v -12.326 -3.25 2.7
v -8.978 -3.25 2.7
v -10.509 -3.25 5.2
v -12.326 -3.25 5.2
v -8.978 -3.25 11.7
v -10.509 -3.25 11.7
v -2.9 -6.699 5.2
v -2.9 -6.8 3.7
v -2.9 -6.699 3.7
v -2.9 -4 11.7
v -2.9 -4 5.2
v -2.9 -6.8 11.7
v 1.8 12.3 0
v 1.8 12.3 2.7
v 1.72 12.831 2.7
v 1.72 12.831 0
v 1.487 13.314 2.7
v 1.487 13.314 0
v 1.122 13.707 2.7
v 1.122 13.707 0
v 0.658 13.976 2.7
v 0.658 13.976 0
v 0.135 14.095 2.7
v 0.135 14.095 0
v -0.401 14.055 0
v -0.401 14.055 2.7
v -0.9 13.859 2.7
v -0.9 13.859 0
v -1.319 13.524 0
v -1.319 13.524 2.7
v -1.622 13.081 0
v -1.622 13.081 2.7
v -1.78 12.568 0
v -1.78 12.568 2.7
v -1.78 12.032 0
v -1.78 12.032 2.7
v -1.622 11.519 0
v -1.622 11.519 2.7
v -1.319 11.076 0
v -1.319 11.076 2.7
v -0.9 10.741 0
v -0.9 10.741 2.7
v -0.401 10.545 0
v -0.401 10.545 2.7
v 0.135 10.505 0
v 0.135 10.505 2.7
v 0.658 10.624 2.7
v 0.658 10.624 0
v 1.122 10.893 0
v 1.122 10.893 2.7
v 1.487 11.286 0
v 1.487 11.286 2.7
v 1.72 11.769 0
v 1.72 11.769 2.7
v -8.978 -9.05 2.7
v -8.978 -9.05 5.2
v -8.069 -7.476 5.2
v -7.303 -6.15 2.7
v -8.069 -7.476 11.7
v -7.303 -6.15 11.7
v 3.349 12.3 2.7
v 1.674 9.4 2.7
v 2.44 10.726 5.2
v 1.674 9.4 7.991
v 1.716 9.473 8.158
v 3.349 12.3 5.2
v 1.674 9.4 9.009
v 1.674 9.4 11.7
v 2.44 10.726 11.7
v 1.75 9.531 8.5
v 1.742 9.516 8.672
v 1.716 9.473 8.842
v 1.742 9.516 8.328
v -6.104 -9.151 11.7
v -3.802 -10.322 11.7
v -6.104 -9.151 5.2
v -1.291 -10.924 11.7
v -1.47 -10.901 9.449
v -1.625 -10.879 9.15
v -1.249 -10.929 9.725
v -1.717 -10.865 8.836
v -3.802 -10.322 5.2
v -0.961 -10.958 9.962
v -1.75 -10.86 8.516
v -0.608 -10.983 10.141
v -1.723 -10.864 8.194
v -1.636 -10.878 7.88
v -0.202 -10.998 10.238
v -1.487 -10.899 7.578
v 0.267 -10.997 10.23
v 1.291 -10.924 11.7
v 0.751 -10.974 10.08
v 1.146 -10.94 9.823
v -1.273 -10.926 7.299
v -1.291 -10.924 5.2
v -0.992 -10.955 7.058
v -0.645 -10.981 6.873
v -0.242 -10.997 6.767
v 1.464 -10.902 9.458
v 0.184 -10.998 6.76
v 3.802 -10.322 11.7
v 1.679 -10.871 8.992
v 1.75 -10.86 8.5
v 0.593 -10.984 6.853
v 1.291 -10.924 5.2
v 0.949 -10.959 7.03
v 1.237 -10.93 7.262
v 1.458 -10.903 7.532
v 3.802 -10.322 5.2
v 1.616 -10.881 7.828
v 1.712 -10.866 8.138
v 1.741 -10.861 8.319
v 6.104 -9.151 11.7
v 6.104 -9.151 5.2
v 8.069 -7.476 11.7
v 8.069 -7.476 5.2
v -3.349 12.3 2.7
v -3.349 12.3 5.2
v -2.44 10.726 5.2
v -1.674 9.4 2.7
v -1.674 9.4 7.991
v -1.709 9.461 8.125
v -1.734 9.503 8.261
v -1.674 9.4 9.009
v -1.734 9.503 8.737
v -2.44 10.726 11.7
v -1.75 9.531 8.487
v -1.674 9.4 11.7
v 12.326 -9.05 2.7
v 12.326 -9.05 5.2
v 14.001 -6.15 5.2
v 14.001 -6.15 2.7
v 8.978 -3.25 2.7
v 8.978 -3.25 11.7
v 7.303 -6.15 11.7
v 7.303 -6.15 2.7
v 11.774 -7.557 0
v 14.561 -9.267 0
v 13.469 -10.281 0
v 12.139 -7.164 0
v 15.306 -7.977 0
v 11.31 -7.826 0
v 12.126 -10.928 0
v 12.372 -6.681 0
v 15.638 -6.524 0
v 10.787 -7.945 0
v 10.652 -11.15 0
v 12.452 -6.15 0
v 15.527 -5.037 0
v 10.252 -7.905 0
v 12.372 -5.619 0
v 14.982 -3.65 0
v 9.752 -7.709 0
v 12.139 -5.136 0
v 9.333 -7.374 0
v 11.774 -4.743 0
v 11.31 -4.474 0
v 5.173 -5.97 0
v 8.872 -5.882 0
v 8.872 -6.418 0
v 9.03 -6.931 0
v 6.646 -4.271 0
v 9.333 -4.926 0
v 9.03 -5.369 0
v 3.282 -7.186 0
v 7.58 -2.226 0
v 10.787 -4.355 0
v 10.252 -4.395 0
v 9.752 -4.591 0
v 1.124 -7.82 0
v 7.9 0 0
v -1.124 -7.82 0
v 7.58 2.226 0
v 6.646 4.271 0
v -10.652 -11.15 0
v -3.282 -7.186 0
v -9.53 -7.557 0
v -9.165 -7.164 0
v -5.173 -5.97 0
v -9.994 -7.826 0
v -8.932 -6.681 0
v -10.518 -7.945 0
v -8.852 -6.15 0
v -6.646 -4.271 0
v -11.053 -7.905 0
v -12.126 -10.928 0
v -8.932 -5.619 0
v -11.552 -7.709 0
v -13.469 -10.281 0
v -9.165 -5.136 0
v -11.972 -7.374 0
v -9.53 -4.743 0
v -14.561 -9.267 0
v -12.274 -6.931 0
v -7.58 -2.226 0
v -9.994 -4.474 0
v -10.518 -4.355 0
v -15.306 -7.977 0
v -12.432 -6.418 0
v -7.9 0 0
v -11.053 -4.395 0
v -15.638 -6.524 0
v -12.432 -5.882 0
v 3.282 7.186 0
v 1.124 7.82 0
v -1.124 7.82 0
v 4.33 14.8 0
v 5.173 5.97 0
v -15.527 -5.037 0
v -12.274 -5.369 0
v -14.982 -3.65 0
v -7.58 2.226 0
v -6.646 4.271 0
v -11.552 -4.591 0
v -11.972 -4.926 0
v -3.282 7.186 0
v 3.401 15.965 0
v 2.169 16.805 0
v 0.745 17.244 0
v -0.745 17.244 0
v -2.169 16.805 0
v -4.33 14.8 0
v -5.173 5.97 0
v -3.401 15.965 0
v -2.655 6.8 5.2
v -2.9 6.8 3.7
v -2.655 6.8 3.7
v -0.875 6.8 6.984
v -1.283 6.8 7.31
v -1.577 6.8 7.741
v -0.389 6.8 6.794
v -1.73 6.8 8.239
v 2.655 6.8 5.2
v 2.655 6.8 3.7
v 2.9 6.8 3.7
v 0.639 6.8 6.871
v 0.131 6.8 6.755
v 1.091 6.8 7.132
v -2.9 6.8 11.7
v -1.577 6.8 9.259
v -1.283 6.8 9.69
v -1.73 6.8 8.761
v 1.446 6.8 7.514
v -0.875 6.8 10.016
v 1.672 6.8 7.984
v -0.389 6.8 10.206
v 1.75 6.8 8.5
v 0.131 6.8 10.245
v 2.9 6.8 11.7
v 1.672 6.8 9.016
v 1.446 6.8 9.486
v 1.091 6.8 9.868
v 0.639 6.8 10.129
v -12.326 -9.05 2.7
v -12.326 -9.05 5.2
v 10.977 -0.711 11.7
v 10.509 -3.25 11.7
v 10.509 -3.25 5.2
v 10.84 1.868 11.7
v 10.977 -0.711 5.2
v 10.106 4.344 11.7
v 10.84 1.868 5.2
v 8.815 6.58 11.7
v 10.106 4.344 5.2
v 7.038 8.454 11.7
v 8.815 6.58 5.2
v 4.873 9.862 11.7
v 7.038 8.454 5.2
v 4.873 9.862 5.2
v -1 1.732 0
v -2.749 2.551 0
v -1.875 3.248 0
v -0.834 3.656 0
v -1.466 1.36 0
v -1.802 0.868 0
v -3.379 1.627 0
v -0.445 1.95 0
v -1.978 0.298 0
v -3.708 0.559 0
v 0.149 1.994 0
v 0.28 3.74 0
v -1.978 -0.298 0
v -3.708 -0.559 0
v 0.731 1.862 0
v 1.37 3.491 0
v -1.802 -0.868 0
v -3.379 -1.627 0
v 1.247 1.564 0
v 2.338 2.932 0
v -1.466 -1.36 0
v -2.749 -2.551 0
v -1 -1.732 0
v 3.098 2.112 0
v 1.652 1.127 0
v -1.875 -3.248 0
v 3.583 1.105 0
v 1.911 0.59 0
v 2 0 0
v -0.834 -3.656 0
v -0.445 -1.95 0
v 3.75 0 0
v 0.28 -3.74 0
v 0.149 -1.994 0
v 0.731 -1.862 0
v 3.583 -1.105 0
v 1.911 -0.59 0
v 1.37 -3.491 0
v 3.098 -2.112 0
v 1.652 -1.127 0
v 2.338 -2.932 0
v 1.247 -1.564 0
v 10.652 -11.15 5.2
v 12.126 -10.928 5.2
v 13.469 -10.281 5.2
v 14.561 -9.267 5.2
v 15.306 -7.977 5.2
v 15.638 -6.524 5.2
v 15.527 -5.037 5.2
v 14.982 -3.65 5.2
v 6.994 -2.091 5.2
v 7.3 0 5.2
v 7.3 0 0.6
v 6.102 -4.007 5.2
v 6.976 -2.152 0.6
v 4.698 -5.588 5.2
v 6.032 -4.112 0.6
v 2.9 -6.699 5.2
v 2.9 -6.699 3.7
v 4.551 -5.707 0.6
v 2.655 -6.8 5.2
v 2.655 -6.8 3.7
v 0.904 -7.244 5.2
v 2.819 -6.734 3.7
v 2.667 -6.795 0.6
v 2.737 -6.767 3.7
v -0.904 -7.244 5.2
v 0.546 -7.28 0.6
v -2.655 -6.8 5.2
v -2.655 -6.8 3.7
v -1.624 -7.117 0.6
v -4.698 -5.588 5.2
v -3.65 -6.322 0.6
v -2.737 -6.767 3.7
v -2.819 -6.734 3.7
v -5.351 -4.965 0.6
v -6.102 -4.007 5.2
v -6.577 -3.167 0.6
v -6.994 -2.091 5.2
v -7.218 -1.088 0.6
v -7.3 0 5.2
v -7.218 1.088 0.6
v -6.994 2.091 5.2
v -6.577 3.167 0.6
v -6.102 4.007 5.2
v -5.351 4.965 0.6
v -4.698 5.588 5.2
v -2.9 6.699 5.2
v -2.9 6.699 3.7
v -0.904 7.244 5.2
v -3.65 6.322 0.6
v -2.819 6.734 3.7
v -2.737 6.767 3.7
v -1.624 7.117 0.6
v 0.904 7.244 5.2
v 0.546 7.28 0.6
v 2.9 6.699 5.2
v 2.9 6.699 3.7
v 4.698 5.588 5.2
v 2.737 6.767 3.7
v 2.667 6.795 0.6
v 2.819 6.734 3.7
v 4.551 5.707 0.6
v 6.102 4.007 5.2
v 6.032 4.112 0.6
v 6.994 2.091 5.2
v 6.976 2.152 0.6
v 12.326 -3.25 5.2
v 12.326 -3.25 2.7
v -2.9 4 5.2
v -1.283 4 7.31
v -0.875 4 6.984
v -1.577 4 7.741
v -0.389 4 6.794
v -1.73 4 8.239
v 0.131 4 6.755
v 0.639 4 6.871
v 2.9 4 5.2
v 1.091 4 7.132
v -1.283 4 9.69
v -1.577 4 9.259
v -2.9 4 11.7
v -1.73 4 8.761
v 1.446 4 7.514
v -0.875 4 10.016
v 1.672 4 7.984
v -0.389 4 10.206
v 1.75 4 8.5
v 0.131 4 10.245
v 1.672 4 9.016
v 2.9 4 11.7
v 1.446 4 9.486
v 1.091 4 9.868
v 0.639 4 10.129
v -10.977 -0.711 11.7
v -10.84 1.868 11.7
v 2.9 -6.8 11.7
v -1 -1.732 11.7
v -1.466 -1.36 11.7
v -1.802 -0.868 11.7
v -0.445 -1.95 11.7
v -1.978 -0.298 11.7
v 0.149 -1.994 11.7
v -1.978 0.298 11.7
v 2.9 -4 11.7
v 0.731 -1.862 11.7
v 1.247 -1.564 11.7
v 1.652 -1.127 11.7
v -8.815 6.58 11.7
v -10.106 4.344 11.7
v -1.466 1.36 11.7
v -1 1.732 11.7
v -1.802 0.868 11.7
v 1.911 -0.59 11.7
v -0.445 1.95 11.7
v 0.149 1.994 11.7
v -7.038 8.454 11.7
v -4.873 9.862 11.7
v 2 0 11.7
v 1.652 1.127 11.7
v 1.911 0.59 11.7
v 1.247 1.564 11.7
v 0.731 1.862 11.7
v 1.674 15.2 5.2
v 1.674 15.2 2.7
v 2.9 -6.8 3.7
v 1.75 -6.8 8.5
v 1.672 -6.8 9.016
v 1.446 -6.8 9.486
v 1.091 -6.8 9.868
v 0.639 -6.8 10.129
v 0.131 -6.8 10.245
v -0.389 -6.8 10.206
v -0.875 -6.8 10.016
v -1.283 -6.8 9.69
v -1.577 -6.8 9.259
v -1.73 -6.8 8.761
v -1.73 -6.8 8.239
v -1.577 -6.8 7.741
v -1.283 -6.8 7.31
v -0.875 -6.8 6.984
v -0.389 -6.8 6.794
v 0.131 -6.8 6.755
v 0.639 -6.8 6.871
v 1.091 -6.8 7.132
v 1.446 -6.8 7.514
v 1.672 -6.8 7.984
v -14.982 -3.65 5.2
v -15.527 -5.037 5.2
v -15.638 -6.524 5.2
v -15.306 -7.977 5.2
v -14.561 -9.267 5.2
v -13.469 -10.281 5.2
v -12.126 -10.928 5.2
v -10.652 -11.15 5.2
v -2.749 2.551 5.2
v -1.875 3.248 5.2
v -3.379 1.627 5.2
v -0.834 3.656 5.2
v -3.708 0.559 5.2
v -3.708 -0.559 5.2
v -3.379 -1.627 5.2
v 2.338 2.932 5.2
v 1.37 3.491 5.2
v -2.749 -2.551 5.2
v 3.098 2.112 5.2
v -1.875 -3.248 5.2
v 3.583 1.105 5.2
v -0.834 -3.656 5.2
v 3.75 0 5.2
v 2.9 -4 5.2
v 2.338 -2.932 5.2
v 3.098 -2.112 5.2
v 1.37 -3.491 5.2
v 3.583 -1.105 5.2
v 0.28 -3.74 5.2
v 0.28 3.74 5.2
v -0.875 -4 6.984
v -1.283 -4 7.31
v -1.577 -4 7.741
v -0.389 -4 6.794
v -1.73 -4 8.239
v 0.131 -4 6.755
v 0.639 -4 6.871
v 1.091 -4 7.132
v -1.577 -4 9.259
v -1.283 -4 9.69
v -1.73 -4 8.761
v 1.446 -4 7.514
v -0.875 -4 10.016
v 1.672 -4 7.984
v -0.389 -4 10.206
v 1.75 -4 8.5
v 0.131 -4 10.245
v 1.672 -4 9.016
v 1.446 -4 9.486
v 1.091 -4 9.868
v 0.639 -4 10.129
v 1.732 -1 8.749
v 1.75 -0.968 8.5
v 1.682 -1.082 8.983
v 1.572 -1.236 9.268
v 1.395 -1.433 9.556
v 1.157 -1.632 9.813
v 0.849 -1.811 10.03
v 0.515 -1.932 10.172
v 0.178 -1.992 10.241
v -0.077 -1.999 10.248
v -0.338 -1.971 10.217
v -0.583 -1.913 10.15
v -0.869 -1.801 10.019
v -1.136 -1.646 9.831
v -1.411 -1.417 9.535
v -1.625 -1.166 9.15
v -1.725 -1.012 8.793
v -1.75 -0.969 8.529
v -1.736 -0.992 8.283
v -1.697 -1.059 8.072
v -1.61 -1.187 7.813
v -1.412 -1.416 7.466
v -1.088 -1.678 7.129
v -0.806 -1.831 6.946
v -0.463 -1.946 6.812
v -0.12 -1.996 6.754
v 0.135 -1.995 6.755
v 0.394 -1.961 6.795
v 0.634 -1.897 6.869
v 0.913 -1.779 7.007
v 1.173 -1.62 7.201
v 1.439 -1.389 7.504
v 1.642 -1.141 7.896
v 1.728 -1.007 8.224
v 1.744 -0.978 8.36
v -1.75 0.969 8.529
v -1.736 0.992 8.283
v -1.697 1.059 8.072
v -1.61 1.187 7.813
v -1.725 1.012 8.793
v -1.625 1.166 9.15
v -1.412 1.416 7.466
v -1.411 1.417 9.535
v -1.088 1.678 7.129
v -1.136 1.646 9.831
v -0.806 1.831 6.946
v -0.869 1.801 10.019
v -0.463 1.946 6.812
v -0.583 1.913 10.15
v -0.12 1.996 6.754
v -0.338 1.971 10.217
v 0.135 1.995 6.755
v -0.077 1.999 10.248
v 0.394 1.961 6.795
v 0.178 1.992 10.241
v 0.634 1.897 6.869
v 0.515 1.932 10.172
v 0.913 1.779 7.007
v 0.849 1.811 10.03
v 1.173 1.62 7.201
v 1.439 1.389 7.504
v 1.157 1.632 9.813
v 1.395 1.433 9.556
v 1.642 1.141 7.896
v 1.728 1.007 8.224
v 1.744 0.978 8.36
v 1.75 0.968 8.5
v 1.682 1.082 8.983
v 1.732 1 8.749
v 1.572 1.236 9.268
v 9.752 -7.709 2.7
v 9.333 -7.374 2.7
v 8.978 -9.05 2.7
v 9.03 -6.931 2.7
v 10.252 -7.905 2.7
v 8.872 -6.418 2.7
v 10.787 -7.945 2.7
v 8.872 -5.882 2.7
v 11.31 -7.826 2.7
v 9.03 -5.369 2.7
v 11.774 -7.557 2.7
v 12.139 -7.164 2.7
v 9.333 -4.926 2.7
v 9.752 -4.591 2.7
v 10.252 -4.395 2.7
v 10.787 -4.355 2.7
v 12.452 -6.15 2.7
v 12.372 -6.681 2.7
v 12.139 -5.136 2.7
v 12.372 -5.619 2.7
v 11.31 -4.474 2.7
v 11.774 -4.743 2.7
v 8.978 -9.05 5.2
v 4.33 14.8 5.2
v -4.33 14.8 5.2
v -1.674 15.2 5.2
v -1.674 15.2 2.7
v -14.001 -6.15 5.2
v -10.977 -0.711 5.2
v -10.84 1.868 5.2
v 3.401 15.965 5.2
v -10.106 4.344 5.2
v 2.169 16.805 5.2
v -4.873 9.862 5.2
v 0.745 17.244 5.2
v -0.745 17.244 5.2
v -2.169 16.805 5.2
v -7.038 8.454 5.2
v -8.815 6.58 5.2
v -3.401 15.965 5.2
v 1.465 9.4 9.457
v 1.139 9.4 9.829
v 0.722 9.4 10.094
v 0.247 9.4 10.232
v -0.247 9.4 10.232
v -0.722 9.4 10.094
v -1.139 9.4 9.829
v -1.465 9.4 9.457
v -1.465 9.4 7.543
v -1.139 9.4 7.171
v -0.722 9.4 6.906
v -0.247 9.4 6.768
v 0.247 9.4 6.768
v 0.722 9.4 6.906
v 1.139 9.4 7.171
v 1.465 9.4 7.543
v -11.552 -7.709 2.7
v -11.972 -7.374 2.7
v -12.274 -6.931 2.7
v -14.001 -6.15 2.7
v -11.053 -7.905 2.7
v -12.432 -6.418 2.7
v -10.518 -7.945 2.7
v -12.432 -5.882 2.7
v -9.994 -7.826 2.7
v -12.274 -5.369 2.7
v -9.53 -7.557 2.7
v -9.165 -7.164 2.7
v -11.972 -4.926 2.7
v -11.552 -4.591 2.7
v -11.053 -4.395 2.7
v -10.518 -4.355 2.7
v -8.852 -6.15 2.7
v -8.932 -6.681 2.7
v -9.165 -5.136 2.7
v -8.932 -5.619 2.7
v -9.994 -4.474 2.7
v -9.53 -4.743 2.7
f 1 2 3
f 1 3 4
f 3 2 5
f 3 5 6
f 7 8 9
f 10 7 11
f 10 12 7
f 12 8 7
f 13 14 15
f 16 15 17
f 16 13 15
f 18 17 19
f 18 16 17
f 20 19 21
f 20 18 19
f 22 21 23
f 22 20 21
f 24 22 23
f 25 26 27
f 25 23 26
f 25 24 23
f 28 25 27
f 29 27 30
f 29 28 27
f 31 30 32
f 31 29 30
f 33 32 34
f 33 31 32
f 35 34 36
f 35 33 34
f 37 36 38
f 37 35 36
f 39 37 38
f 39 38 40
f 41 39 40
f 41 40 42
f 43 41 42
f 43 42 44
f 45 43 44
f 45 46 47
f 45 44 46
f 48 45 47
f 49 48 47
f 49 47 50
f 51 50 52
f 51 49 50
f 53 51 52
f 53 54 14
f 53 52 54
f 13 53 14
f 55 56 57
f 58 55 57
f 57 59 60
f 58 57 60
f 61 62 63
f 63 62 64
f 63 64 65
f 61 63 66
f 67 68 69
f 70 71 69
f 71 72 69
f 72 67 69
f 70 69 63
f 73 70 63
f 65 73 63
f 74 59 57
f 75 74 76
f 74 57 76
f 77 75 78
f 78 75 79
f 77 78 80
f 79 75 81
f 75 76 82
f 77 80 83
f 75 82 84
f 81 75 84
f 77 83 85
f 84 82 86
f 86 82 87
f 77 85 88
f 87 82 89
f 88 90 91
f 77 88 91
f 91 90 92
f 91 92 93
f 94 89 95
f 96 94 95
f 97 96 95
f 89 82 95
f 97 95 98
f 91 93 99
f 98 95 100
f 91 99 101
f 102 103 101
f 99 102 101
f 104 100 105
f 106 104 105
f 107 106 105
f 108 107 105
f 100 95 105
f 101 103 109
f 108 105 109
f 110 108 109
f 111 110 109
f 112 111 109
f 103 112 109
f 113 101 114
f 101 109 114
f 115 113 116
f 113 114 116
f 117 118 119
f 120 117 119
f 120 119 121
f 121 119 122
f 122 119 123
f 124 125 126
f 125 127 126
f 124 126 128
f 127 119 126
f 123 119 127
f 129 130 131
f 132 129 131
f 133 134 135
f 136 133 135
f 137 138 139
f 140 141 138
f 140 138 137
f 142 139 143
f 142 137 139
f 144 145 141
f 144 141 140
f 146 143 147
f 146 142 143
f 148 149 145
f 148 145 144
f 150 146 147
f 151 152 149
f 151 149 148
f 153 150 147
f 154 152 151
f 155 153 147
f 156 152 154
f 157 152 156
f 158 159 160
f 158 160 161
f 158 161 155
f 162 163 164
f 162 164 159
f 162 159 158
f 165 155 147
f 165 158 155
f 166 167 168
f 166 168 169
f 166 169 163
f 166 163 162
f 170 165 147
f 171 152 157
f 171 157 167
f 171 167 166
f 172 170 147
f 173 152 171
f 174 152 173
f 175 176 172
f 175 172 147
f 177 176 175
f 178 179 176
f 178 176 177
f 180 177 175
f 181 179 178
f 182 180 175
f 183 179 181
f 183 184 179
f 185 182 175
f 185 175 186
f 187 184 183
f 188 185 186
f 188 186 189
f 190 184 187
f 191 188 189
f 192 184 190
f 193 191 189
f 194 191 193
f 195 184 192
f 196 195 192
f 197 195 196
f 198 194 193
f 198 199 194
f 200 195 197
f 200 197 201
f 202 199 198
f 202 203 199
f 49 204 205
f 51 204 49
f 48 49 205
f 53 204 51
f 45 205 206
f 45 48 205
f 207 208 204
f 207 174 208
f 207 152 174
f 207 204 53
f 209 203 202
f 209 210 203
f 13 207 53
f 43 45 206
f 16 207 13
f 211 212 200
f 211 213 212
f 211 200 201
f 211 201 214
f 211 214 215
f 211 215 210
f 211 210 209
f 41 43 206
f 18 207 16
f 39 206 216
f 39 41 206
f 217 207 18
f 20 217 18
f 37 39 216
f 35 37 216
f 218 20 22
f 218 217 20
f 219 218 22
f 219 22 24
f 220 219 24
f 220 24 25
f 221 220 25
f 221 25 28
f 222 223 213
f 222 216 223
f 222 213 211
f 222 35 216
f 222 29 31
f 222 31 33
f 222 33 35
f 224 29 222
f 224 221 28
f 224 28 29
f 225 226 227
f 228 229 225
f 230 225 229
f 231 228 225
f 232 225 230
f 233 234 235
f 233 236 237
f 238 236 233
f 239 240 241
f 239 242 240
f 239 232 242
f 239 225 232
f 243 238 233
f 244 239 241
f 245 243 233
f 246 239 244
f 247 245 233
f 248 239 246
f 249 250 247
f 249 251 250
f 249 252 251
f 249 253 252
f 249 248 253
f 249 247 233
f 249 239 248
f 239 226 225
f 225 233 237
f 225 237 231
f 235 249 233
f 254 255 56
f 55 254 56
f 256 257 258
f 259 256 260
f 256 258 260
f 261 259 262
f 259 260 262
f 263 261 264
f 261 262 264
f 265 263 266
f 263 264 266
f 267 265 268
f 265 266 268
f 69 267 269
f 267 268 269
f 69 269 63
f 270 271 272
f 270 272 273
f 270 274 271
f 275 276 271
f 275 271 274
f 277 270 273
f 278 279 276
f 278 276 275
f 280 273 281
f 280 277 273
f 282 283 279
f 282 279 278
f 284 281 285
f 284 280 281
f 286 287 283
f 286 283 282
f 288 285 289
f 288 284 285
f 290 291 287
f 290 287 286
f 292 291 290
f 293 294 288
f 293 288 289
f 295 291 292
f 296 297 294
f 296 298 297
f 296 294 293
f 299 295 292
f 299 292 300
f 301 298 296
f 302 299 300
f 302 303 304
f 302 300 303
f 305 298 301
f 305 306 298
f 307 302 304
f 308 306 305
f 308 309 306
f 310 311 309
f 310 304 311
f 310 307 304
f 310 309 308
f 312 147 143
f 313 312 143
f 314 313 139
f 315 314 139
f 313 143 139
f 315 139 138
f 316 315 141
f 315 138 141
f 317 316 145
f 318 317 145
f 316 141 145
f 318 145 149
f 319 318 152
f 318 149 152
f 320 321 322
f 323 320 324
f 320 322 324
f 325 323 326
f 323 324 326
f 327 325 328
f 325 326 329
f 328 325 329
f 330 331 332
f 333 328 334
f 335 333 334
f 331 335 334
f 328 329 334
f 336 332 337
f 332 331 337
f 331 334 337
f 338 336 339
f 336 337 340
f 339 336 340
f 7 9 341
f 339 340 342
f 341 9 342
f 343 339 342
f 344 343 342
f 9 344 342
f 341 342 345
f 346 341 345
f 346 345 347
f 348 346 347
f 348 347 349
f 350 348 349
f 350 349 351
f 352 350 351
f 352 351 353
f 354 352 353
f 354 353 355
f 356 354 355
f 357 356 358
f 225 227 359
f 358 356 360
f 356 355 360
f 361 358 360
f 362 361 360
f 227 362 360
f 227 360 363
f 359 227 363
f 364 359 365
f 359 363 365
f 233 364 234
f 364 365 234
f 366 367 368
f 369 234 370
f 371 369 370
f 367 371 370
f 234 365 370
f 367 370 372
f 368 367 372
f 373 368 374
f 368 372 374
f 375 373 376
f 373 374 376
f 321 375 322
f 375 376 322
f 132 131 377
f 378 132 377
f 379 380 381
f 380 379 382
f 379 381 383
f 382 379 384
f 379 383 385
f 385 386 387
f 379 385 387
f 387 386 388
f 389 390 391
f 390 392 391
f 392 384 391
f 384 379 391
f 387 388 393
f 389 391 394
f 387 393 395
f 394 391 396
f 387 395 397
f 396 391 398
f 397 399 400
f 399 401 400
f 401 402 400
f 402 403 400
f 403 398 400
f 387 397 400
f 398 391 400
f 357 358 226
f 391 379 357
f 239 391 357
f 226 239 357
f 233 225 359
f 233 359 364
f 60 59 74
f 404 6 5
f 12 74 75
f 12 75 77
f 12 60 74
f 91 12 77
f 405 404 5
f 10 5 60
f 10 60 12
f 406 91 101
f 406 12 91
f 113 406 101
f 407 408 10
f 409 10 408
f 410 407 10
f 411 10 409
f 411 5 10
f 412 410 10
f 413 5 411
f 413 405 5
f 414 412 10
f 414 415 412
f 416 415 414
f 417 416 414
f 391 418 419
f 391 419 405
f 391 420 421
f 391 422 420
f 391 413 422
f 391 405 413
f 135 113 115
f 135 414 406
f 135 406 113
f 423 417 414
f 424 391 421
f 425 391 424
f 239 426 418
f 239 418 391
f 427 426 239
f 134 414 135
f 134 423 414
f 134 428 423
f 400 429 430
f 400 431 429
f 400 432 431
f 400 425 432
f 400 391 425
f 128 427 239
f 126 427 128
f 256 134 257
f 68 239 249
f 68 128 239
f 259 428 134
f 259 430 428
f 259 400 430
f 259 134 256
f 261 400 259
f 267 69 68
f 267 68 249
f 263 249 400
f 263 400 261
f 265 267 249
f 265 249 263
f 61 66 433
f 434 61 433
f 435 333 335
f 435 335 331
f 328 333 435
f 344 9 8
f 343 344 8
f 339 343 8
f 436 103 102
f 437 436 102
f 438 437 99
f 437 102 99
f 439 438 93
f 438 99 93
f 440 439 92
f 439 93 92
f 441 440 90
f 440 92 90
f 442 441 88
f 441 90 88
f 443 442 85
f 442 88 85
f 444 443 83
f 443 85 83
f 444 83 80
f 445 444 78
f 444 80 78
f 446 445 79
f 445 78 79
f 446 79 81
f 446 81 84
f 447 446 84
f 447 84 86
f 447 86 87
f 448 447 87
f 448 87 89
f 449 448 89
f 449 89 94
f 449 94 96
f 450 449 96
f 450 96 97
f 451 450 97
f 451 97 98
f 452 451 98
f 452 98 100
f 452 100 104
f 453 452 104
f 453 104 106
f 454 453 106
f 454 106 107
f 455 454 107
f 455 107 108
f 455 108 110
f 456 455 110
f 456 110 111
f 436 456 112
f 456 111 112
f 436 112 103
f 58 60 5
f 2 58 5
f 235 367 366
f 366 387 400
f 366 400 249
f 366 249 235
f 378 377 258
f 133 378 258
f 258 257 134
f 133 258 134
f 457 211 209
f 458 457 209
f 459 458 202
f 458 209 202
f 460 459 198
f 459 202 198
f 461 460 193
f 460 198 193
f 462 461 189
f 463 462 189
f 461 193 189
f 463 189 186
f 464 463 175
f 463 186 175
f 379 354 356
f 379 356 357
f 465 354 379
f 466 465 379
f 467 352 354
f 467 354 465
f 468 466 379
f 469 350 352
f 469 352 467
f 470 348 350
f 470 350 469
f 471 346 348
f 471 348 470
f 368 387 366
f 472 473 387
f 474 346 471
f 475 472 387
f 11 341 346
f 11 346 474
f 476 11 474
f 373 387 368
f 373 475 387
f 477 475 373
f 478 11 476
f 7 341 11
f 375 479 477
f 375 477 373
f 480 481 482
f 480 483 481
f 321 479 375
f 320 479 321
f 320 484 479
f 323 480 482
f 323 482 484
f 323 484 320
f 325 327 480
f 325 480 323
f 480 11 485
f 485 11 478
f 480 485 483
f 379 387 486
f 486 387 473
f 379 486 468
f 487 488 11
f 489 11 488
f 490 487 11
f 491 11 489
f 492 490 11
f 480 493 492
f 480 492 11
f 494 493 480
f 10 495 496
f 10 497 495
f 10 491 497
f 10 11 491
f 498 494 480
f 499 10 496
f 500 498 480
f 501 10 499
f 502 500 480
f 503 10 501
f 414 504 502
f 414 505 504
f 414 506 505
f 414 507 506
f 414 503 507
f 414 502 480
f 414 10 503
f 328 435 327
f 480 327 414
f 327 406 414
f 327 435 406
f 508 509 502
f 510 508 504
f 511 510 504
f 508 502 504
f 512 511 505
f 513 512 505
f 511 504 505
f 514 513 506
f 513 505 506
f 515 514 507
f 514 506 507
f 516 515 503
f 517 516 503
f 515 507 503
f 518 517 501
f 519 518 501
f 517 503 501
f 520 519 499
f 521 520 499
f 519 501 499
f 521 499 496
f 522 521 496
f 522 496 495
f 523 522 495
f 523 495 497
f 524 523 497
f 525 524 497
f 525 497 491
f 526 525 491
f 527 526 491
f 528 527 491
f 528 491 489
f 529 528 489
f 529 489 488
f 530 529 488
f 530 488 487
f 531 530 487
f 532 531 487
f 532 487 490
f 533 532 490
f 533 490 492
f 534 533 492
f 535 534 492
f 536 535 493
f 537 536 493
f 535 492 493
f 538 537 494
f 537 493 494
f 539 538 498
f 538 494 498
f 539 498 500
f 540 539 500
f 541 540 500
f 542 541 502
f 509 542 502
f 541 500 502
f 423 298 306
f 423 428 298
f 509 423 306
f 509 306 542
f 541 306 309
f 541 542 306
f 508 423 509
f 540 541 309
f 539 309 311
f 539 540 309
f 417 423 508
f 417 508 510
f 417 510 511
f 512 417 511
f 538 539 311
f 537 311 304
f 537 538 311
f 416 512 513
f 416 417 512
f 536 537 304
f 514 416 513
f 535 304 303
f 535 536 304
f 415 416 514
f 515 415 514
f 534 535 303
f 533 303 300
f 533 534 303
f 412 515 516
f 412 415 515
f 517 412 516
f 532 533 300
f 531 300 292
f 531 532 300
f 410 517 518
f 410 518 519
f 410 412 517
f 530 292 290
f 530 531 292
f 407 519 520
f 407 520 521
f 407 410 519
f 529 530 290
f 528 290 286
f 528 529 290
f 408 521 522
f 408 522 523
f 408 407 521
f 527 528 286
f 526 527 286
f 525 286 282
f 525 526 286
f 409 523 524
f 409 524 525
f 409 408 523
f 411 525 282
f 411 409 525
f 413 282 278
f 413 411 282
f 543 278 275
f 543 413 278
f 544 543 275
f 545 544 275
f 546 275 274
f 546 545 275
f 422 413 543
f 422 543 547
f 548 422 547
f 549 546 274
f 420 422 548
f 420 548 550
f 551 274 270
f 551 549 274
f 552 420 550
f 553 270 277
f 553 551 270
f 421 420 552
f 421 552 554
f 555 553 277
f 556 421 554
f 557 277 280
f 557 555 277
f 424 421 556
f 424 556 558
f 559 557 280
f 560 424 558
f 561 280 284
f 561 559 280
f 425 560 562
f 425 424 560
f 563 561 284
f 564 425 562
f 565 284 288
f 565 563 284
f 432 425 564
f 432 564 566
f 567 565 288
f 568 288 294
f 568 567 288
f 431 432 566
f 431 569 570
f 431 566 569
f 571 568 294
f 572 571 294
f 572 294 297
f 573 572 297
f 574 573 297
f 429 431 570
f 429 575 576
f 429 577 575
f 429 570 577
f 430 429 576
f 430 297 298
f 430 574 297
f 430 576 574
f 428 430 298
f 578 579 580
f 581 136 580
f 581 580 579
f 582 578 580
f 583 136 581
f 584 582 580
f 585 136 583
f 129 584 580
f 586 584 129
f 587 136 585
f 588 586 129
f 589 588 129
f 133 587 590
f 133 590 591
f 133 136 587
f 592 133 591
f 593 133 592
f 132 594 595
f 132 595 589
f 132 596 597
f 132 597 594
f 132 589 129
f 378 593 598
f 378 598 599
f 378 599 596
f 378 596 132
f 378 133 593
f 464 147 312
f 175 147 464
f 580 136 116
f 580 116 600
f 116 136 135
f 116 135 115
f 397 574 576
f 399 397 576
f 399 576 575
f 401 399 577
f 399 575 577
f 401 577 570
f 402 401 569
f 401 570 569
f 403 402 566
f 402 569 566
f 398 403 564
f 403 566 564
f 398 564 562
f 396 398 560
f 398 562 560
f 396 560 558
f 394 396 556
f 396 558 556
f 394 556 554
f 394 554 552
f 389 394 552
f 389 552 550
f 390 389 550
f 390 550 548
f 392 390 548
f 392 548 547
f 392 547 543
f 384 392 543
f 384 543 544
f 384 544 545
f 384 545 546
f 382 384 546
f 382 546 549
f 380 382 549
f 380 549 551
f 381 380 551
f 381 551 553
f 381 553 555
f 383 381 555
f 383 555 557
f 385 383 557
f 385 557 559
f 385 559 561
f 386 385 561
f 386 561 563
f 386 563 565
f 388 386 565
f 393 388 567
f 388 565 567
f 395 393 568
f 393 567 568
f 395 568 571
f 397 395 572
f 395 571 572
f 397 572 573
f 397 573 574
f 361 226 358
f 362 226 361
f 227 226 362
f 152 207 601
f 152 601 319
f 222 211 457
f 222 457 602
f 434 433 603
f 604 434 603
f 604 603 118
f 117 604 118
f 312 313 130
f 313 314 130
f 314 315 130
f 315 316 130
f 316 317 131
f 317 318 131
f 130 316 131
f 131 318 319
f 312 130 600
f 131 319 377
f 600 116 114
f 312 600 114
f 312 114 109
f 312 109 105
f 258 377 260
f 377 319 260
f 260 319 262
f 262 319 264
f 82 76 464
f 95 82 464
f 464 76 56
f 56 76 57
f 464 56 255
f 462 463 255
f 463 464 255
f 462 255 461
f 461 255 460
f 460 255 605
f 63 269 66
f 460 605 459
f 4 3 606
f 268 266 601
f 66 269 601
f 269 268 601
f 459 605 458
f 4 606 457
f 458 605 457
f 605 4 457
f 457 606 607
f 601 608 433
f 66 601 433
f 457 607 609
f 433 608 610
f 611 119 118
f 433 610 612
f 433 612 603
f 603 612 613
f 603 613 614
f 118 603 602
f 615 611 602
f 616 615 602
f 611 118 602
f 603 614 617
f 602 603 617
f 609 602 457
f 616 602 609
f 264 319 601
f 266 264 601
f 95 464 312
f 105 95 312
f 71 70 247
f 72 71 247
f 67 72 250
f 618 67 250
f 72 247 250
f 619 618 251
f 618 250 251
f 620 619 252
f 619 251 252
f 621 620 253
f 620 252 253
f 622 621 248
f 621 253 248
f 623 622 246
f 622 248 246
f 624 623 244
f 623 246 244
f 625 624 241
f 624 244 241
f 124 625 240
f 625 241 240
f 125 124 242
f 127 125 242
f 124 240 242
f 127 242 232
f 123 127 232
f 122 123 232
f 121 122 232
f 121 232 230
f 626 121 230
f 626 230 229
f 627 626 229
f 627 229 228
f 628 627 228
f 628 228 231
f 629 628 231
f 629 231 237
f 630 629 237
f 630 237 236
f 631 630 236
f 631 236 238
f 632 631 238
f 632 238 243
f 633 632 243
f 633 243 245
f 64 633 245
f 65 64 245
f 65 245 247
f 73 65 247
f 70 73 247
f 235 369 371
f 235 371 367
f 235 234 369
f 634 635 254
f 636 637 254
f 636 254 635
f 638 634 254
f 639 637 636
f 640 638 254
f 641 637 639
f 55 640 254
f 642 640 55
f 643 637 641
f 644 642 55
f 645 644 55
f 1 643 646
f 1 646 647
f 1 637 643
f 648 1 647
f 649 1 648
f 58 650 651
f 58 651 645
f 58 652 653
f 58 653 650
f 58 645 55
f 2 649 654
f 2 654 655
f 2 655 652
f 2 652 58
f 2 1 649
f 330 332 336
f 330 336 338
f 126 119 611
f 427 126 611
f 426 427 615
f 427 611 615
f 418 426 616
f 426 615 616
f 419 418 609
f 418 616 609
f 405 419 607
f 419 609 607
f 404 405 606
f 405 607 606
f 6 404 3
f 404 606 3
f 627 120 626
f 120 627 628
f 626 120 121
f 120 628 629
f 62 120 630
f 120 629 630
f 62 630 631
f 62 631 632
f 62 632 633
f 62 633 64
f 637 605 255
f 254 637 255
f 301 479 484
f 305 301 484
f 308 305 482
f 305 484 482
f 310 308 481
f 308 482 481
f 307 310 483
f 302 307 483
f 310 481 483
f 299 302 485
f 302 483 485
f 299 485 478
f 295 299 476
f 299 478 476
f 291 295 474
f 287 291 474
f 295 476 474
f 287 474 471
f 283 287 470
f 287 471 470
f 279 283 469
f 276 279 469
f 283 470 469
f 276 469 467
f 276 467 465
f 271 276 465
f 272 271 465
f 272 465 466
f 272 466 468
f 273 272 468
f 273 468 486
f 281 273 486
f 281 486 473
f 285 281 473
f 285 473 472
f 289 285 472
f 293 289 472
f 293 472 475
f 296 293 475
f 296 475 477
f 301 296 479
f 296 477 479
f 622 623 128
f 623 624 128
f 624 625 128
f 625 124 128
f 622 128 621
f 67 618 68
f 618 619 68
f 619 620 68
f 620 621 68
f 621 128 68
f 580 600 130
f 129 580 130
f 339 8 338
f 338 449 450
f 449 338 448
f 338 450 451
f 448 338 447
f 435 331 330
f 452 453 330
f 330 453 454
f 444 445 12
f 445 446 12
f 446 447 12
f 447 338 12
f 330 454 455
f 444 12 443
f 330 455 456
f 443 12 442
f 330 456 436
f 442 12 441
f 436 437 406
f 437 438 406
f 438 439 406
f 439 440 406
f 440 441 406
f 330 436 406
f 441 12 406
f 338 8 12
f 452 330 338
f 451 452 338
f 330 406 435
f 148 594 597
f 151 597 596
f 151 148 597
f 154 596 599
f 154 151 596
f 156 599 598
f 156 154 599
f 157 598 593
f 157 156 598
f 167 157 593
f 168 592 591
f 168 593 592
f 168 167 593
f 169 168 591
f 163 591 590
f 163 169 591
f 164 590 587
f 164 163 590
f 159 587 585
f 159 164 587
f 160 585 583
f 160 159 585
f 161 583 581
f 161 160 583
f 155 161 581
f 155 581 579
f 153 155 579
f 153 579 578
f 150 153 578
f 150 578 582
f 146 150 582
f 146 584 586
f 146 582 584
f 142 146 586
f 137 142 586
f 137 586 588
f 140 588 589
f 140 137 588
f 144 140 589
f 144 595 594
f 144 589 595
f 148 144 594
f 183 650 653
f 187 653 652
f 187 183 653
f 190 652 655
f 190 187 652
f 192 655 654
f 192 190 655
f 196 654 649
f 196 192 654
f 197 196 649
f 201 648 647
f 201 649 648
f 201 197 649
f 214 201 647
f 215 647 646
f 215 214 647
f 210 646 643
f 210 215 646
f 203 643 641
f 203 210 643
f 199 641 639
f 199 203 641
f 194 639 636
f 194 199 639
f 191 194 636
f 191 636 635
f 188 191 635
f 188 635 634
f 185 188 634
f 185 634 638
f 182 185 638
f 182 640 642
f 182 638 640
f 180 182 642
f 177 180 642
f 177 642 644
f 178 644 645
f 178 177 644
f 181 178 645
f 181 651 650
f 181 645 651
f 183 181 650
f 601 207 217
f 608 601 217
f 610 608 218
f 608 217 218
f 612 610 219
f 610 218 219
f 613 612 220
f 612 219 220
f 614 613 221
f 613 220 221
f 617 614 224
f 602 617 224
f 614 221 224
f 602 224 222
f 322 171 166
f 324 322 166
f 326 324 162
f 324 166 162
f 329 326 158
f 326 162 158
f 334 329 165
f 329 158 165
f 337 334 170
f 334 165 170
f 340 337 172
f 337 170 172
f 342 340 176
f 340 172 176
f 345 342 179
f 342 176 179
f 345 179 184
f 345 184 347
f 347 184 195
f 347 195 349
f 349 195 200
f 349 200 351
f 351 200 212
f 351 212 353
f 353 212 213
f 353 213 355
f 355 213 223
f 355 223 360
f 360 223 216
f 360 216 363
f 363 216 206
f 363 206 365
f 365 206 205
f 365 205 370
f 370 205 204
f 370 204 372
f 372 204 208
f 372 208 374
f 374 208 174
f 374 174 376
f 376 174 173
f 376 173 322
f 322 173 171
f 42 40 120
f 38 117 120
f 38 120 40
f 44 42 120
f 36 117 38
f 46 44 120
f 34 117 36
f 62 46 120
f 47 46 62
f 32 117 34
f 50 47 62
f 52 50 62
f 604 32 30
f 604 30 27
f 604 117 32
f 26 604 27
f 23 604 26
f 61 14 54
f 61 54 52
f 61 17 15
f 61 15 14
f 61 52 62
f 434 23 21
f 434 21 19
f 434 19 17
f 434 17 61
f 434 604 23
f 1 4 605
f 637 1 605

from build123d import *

# Parameters (mm, degrees)
SKETCH_R        = 1.8
PAD_DEPTH       = 5.2
SKETCH002_R     = 11
SKETCH002_R_2   = 2
PAD001_DEPTH    = 6.5
SKETCH003_R     = 7.3
POCKET001_DEPTH = 5.2
POCKET_DEPTH    = 9
SKETCH005_R     = 1.75
POCKET002_DEPTH = 28.451
SKETCH006_W     = 5.8
SKETCH006_H     = 2.8
POCKET003_DEPTH = 8
SKETCH007_R     = 3.75
SKETCH007_R_2   = 2
PAD002_DEPTH    = 5.2
CHAMFER_SIZE    = 0.6


with BuildPart() as part:
    # Sketch → Pad (new body)
    with BuildSketch(Plane.XY):
        with BuildLine():
            Line((-14.982239, -3.65), (-4.330127, 14.8))
            ThreePointArc((4.330127, 14.8), (0, 17.3), (-4.330127, 14.8))
            Line((4.330127, 14.8), (14.982239, -3.65))
            ThreePointArc((10.652112, -11.15), (14.982239, -8.65), (14.982239, -3.65))
            Line((10.652112, -11.15), (-10.652112, -11.15))
            ThreePointArc((-14.982239, -3.65), (-14.982239, -8.65), (-10.652112, -11.15))
        make_face()
        with Locations((0, 12.3)):
            Circle(SKETCH_R, mode=Mode.SUBTRACT)
        with Locations((-10.652112, -6.15)):
            Circle(SKETCH_R, mode=Mode.SUBTRACT)
        with Locations((10.652112, -6.15)):
            Circle(SKETCH_R, mode=Mode.SUBTRACT)
    extrude(amount=PAD_DEPTH)

    # Sketch002 (on Face11 of Pad) → Pad001 (join)
    with BuildSketch(Plane.XY.offset(5.2)):
        Circle(SKETCH002_R)
        Circle(SKETCH002_R_2, mode=Mode.SUBTRACT)
    extrude(amount=PAD001_DEPTH)

    # Sketch003 (on Face4 of Pad001) → Pocket001 (cut)
    with BuildSketch(Plane(origin=(0, 0, 0), x_dir=(1, 0, 0), z_dir=(0, 0, -1))):
        Circle(SKETCH003_R)
    extrude(amount=-POCKET001_DEPTH, mode=Mode.SUBTRACT)

    # Sketch004 (on Face18 of Pocket001) → Pocket (cut)
    with BuildSketch(Plane.XY.offset(11.7)):
        Polygon((-7.303481, -6.15), (-8.977797, -3.25), (-12.326428, -3.25), (-14.000744, -6.15), (-12.326428, -9.05), (-8.977797, -9.05), align=None)
        Polygon((1.674316, 9.4), (3.348632, 12.3), (1.674316, 15.2), (-1.674316, 15.2), (-3.348632, 12.3), (-1.674316, 9.4), align=None)
        Polygon((12.326428, -9.05), (14.000744, -6.15), (12.326428, -3.25), (8.977797, -3.25), (7.303481, -6.15), (8.977797, -9.05), align=None)
    extrude(amount=-POCKET_DEPTH, mode=Mode.SUBTRACT)

    # Sketch005 (on Face6 of Pocket) → Pocket002 (cut, through all)
    with BuildSketch(Plane.XZ.offset(11.15)):
        with Locations((0, 8.5)):
            Circle(SKETCH005_R)
    extrude(amount=-POCKET002_DEPTH, mode=Mode.SUBTRACT)

    # Sketch006 (on Face36 of Pocket002) → Pocket003 (cut)
    with BuildSketch(Plane.XY.offset(11.7)):
        with Locations((0, 5.4)):
            Rectangle(SKETCH006_W, SKETCH006_H)
        with Locations((0, -5.4)):
            Rectangle(SKETCH006_W, SKETCH006_H)
    extrude(amount=-POCKET003_DEPTH, mode=Mode.SUBTRACT)

    # Sketch007 (on Face33 of Pocket003) → Pad002 (join)
    with BuildSketch(Plane(origin=(0, 0, 5.2), x_dir=(1, 0, 0), z_dir=(0, 0, -1))):
        Circle(SKETCH007_R)
        Circle(SKETCH007_R_2, mode=Mode.SUBTRACT)
    extrude(amount=PAD002_DEPTH)

    # Chamfer
    chamfer_edges = [part.edges().sort_by_distance(p)[0] for p in [
        (-7.3, 0, 0),
    ]]
    chamfer(chamfer_edges, length=CHAMFER_SIZE)


solid = part.part
